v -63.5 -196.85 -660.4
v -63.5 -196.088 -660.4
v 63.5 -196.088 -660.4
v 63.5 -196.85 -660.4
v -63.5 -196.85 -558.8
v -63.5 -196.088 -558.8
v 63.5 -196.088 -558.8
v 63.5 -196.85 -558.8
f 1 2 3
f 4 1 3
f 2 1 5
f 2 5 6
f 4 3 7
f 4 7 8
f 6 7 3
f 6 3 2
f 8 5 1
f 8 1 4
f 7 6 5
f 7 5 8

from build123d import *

# Parameters (mm, degrees)
BOSS_EXTRUDE1_DEPTH             = 479.425
BOSS_EXTRUDE1_2_DEPTH           = 479.425
SKETCH2_R                       = 1.5875
SKETCH2_W                       = 5.588
SKETCH2_H                       = 25.4
BOSS_EXTRUDE2_DEPTH             = 3.175
SKETCH3_R                       = 1.5875
BOSS_EXTRUDE3_DEPTH             = 3.175
SKETCH4_R                       = 1.5875
BOSS_EXTRUDE4_DEPTH             = 3.175
BOSS_EXTRUDE5_DEPTH             = 3.175
SKETCH6_R                       = 1.5875
BOSS_EXTRUDE6_DEPTH             = 3.175
BOSS_EXTRUDE8_RIGHT_START       = -0.762
SKETCH8_W                       = 3.175
SKETCH8_H                       = 25.4
BOSS_EXTRUDE8_RIGHT_DEPTH       = 5.588
BOSS_EXTRUDE8_LEFT_START        = -189.738
BOSS_EXTRUDE8_LEFT_OUTLINE_W    = 3.175
BOSS_EXTRUDE8_LEFT_OUTLINE_H    = 25.4
BOSS_EXTRUDE8_LEFT_DEPTH        = 5.588
BASE_FLANGE1_DEPTH              = 482.6
BASE_FLANGE2_DEPTH              = 482.6
SKETCH13_W                      = 0.762
SKETCH13_H                      = 63.5
BASE_FLANGE3_DEPTH              = 482.6
HOLE1_START                     = 93
HOLE1_OUTLINE_R                 = 1.7526
HOLE1_DEPTH                     = 3
HOLE1_START_2                   = 88
HOLE1_2_OUTLINE_R               = 1.7526
HOLE1_2_DEPTH                   = 7
SKETCH24_W                      = 1.35255
SKETCH24_H                      = 184.15
F_6_32_TAPPED_HOLE1_AT_2_COUNT  = 2
F_6_32_TAPPED_HOLE1_AT_2_PITCH  = 152.4
F_6_32_TAPPED_HOLE1_AT_3_COUNT  = 2
F_6_32_TAPPED_HOLE1_AT_3_PITCH  = 304.8
F_6_32_TAPPED_HOLE1_AT_4_COUNT  = 2
F_6_32_TAPPED_HOLE1_AT_4_PITCH  = 457.2
HOLE2_START                     = -96
HOLE2_OUTLINE_R                 = 1.7526
HOLE2_DEPTH                     = 192
HOLE2_START_2                   = -95
HOLE2_2_OUTLINE_R               = 1.7526
HOLE2_2_DEPTH                   = 7
HOLE2_START_3                   = 88
HOLE2_3_OUTLINE_R               = 1.7526
HOLE2_3_DEPTH                   = 7
SKETCH26_W                      = 1.35255
SKETCH26_H                      = 184.15
F_6_32_TAPPED_HOLE2_AT_2_COUNT  = 2
F_6_32_TAPPED_HOLE2_AT_2_PITCH  = 50.8
F_6_32_TAPPED_HOLE2_AT_3_COUNT  = 2
F_6_32_TAPPED_HOLE2_AT_3_PITCH  = 101.6
F_6_32_TAPPED_HOLE2_AT_4_COUNT  = 2
F_6_32_TAPPED_HOLE2_AT_4_PITCH  = 152.4
F_6_32_TAPPED_HOLE2_AT_5_COUNT  = 2
F_6_32_TAPPED_HOLE2_AT_5_PITCH  = 203.2
F_6_32_TAPPED_HOLE2_AT_6_COUNT  = 2
F_6_32_TAPPED_HOLE2_AT_6_PITCH  = 254
F_6_32_TAPPED_HOLE2_AT_7_COUNT  = 2
F_6_32_TAPPED_HOLE2_AT_7_PITCH  = 304.8
F_6_32_TAPPED_HOLE2_AT_8_COUNT  = 2
F_6_32_TAPPED_HOLE2_AT_8_PITCH  = 355.6
F_6_32_TAPPED_HOLE2_AT_9_COUNT  = 2
F_6_32_TAPPED_HOLE2_AT_9_PITCH  = 406.4
F_6_32_TAPPED_HOLE2_AT_10_COUNT = 2
F_6_32_TAPPED_HOLE2_AT_10_PITCH = 457.2
SKETCH21_W                      = 1.35255
SKETCH21_H                      = 3.176
F_6_32_TAPPED_HOLE3_AT_2_COUNT  = 2
F_6_32_TAPPED_HOLE3_AT_2_PITCH  = 25.4
F_6_32_TAPPED_HOLE3_AT_3_COUNT  = 2
F_6_32_TAPPED_HOLE3_AT_3_PITCH  = 50.8
F_6_32_TAPPED_HOLE3_AT_4_COUNT  = 2
F_6_32_TAPPED_HOLE3_AT_4_PITCH  = 76.2
F_6_32_TAPPED_HOLE3_AT_5_COUNT  = 2
F_6_32_TAPPED_HOLE3_AT_5_PITCH  = 101.6
F_6_32_TAPPED_HOLE3_AT_6_COUNT  = 2
F_6_32_TAPPED_HOLE3_AT_6_PITCH  = 127
F_6_32_TAPPED_HOLE3_AT_7_COUNT  = 2
F_6_32_TAPPED_HOLE3_AT_7_PITCH  = 203.2
F_6_32_TAPPED_HOLE3_AT_8_COUNT  = 2
F_6_32_TAPPED_HOLE3_AT_8_PITCH  = 152.4
F_6_32_TAPPED_HOLE3_AT_9_COUNT  = 2
F_6_32_TAPPED_HOLE3_AT_9_PITCH  = 177.8
F_6_32_TAPPED_HOLE3_AT_10_COUNT = 2
F_6_32_TAPPED_HOLE3_AT_10_PITCH = 254
F_6_32_TAPPED_HOLE3_AT_11_COUNT = 2
F_6_32_TAPPED_HOLE3_AT_11_PITCH = 279.4
F_6_32_TAPPED_HOLE3_AT_12_COUNT = 2
F_6_32_TAPPED_HOLE3_AT_12_PITCH = 304.8
F_6_32_TAPPED_HOLE3_AT_13_COUNT = 2
F_6_32_TAPPED_HOLE3_AT_13_PITCH = 330.2
F_6_32_TAPPED_HOLE3_AT_14_COUNT = 2
F_6_32_TAPPED_HOLE3_AT_14_PITCH = 355.6
F_6_32_TAPPED_HOLE3_AT_15_COUNT = 2
F_6_32_TAPPED_HOLE3_AT_15_PITCH = 381
F_6_32_TAPPED_HOLE3_AT_16_COUNT = 2
F_6_32_TAPPED_HOLE3_AT_16_PITCH = 406.4
F_6_32_TAPPED_HOLE3_AT_17_COUNT = 2
F_6_32_TAPPED_HOLE3_AT_17_PITCH = 431.8
MIRROR1_COPY_1_SKETCH_W         = 1.35255
MIRROR1_COPY_1_SKETCH_H         = 3.176
MIRROR1_COPY_2_SKETCH_W         = 1.35255
MIRROR1_COPY_2_SKETCH_H         = 3.176
MIRROR1_COPY_3_SKETCH_W         = 1.35255
MIRROR1_COPY_3_SKETCH_H         = 3.176
MIRROR1_COPY_4_SKETCH_W         = 1.35255
MIRROR1_COPY_4_SKETCH_H         = 3.176
MIRROR1_COPY_5_SKETCH_W         = 1.35255
MIRROR1_COPY_5_SKETCH_H         = 3.176
MIRROR1_COPY_6_SKETCH_W         = 1.35255
MIRROR1_COPY_6_SKETCH_H         = 3.176
MIRROR1_COPY_7_SKETCH_W         = 1.35255
MIRROR1_COPY_7_SKETCH_H         = 3.176
MIRROR1_COPY_8_SKETCH_W         = 1.35255
MIRROR1_COPY_8_SKETCH_H         = 3.176
MIRROR1_COPY_9_SKETCH_W         = 1.35255
MIRROR1_COPY_9_SKETCH_H         = 3.176
MIRROR1_COPY_10_SKETCH_W        = 1.35255
MIRROR1_COPY_10_SKETCH_H        = 3.176
MIRROR1_COPY_11_SKETCH_W        = 1.35255
MIRROR1_COPY_11_SKETCH_H        = 3.176
MIRROR1_COPY_12_SKETCH_W        = 1.35255
MIRROR1_COPY_12_SKETCH_H        = 3.176
MIRROR1_COPY_13_SKETCH_W        = 1.35255
MIRROR1_COPY_13_SKETCH_H        = 3.176
MIRROR1_COPY_14_SKETCH_W        = 1.35255
MIRROR1_COPY_14_SKETCH_H        = 3.176
MIRROR1_COPY_15_SKETCH_W        = 1.35255
MIRROR1_COPY_15_SKETCH_H        = 3.176
MIRROR1_COPY_16_SKETCH_W        = 1.35255
MIRROR1_COPY_16_SKETCH_H        = 3.176
SKETCH9_R                       = 1.5875
NOSECONE_BASE_DEPTH             = 3.175
NOSECONE_BASE_DRAFT             = 20
SPLIT1_START                    = -558.8
SPLIT1_DEPTH                    = 361.95
SPLIT1_START_2                  = -679.45
SPLIT1_2_DEPTH                  = 120.65
SPLIT1_3_OUTLINE_W              = 127
SPLIT1_3_OUTLINE_H              = 0.762
SPLIT1_3_DEPTH                  = 19.05


with BuildPart() as part:
    # Sketch1 → Boss-Extrude1 (new body)
    with BuildSketch(Plane.XY.offset(-196.85)):
        Polygon((88.9, -136.525), (85.725, -136.525), (85.725, -114.3), (63.5, -114.3), (63.5, -111.125), (88.9, -111.125), align=None)
    extrude(amount=-BOSS_EXTRUDE1_DEPTH)

    # Sketch24 → #6-32 Tapped Hole1 (revolve, cut)
    with BuildSketch(Plane(origin=(88.9, -117.475, -209.55), x_dir=(0, 0, -1), z_dir=(0, 1, 0))):
        with Locations((0.676275, 92.075)):
            Rectangle(SKETCH24_W, SKETCH24_H)
    f_6_32_tapped_hole1 = revolve(axis=Axis((95.25, -117.475, -209.55), (-1, 0, 0)), mode=Mode.SUBTRACT)

    # #6-32 Tapped Hole1 at 2: #6-32 Tapped Hole1 ×2
    with Locations(*[(0, 0, -i * F_6_32_TAPPED_HOLE1_AT_2_PITCH) for i in range(1, F_6_32_TAPPED_HOLE1_AT_2_COUNT)]):
        add(f_6_32_tapped_hole1, mode=Mode.SUBTRACT)

    # #6-32 Tapped Hole1 at 3: #6-32 Tapped Hole1 ×2
    with Locations(*[(0, 0, -i * F_6_32_TAPPED_HOLE1_AT_3_PITCH) for i in range(1, F_6_32_TAPPED_HOLE1_AT_3_COUNT)]):
        add(f_6_32_tapped_hole1, mode=Mode.SUBTRACT)

    # #6-32 Tapped Hole1 at 4: #6-32 Tapped Hole1 ×2
    with Locations(*[(0, 0, -i * F_6_32_TAPPED_HOLE1_AT_4_PITCH) for i in range(1, F_6_32_TAPPED_HOLE1_AT_4_COUNT)]):
        add(f_6_32_tapped_hole1, mode=Mode.SUBTRACT)


with BuildPart() as body_2:
    # Sketch1 → Boss-Extrude1 2 (new body)
    with BuildSketch(Plane.XY.offset(-196.85)):
        Polygon((-63.5, -114.3), (-63.5, -111.125), (-88.9, -111.125), (-88.9, -136.525), (-85.725, -136.525), (-85.725, -114.3), align=None)
    extrude(amount=-BOSS_EXTRUDE1_2_DEPTH)


with BuildPart() as body_3:
    # Sketch2 → Boss-Extrude2 (new body)
    # profile 1 of 3: a face of its own
    with BuildSketch(Plane.XY.offset(-196.85)):
        with BuildLine():
            Line((94.488, -171.45), (94.488, -136.525))
            Line((94.488, -136.525), (88.9, -136.525))
            Line((88.9, -136.525), (85.725, -136.525))
            Line((85.725, -136.525), (85.725, -114.3))
            Line((85.725, -114.3), (63.5, -114.3))
            Line((63.5, -114.3), (63.5, -111.125))
            Line((63.5, -111.125), (88.9, -111.125))
            Line((88.9, -111.125), (88.9, -85.725))
            Line((88.9, -85.725), (88.9, -60.325))
            Line((88.9, -60.325), (94.488, -60.325))
            Line((94.488, -60.325), (94.488, -25.4))
            ThreePointArc((94.488, -25.4), (87.271696875, -7.978303125), (69.85, -0.762))
            Line((69.85, -0.762), (-69.85, -0.762))
            ThreePointArc((-69.85, -0.762), (-87.271696875, -7.978303125), (-94.488, -25.4))
            Line((-94.488, -25.4), (-94.488, -60.325))
            Line((-94.488, -60.325), (-88.9, -60.325))
            Line((-88.9, -60.325), (-88.9, -85.725))
            Line((-88.9, -85.725), (-94.488, -85.725))
            Line((-94.488, -85.725), (-94.488, -111.125))
            Line((-94.488, -111.125), (-88.9, -111.125))
            Line((-88.9, -111.125), (-63.5, -111.125))
            Line((-63.5, -111.125), (-63.5, -114.3))
            Line((-63.5, -114.3), (-85.725, -114.3))
            Line((-85.725, -114.3), (-85.725, -136.525))
            Line((-85.725, -136.525), (-88.9, -136.525))
            Line((-88.9, -136.525), (-94.488, -136.525))
            Line((-94.488, -136.525), (-94.488, -171.45))
            ThreePointArc((-94.488, -171.45), (-87.271696875, -188.871696875), (-69.85, -196.088))
            Line((-69.85, -196.088), (69.85, -196.088))
            ThreePointArc((69.85, -196.088), (87.271696875, -188.871696875), (94.488, -171.45))
        make_face()
        with Locations((-19.05, -155.575)):
            Circle(SKETCH2_R, mode=Mode.SUBTRACT)
        with Locations((-19.05, -127)):
            Circle(SKETCH2_R, mode=Mode.SUBTRACT)
        with Locations((19.05, -155.575)):
            Circle(SKETCH2_R, mode=Mode.SUBTRACT)
        with Locations((19.05, -127)):
            Circle(SKETCH2_R, mode=Mode.SUBTRACT)
        with Locations((-83.82, -84.836714101)):
            Circle(SKETCH2_R, mode=Mode.SUBTRACT)
        with BuildLine():
            ThreePointArc((-64.77, -88.9), (-68.362102448, -87.412102448), (-69.85, -83.82))
            Line((-69.85, -83.82), (-69.85, -54.309589078))
            ThreePointArc((-69.85, -54.309589078), (-66.714031836, -49.616281053), (-61.177897552, -50.71748663))
            Line((-61.177897552, -50.71748663), (-31.66748663, -80.227897552))
            ThreePointArc((-31.66748663, -80.227897552), (-30.566281053, -85.764031836), (-35.259589078, -88.9))
            Line((-35.259589078, -88.9), (-64.77, -88.9))
        make_face(mode=Mode.SUBTRACT)
        with BuildLine():
            ThreePointArc((-50.88251337, -34.072102448), (-51.983718947, -28.535968164), (-47.290410922, -25.4))
            Line((-47.290410922, -25.4), (47.290410922, -25.4))
            ThreePointArc((47.290410922, -25.4), (51.983718947, -28.535968164), (50.88251337, -34.072102448))
            Line((50.88251337, -34.072102448), (3.592102448, -81.36251337))
            ThreePointArc((3.592102448, -81.36251337), (0, -82.850410922), (-3.592102448, -81.36251337))
            Line((-3.592102448, -81.36251337), (-50.88251337, -34.072102448))
        make_face(mode=Mode.SUBTRACT)
        with Locations((-19.05, -12.7)):
            Circle(SKETCH2_R, mode=Mode.SUBTRACT)
        with BuildLine():
            Line((64.77, -88.9), (35.259589078, -88.9))
            ThreePointArc((35.259589078, -88.9), (30.566281053, -85.764031836), (31.66748663, -80.227897552))
            Line((31.66748663, -80.227897552), (61.177897552, -50.71748663))
            ThreePointArc((61.177897552, -50.71748663), (66.714031836, -49.616281053), (69.85, -54.309589078))
            Line((69.85, -54.309589078), (69.85, -83.82))
            ThreePointArc((69.85, -83.82), (68.362102448, -87.412102448), (64.77, -88.9))
        make_face(mode=Mode.SUBTRACT)
        with Locations((19.05, -12.7)):
            Circle(SKETCH2_R, mode=Mode.SUBTRACT)
    # profile 2 of 3: a face of its own
    with BuildSketch(Plane.XY.offset(-196.85)):
        with Locations((91.694, -98.425)):
            Rectangle(SKETCH2_W, SKETCH2_H)
    # profile 3 of 3: a face of its own
    with BuildSketch(Plane.XY.offset(-196.85)):
        with BuildLine():
            Line((94.488, -171.45), (94.488, -136.525))
            Line((94.488, -136.525), (88.9, -136.525))
            Line((88.9, -136.525), (85.725, -136.525))
            Line((85.725, -136.525), (85.725, -114.3))
            Line((85.725, -114.3), (63.5, -114.3))
            Line((63.5, -114.3), (63.5, -111.125))
            Line((63.5, -111.125), (88.9, -111.125))
            Line((88.9, -111.125), (88.9, -85.725))
            Line((88.9, -85.725), (88.9, -60.325))
            Line((88.9, -60.325), (94.488, -60.325))
            Line((94.488, -60.325), (94.488, -25.4))
            ThreePointArc((94.488, -25.4), (87.271696875, -7.978303125), (69.85, -0.762))
            Line((69.85, -0.762), (-69.85, -0.762))
            ThreePointArc((-69.85, -0.762), (-87.271696875, -7.978303125), (-94.488, -25.4))
            Line((-94.488, -25.4), (-94.488, -60.325))
            Line((-94.488, -60.325), (-88.9, -60.325))
            Line((-88.9, -60.325), (-88.9, -85.725))
            Line((-88.9, -85.725), (-94.488, -85.725))
            Line((-94.488, -85.725), (-94.488, -111.125))
            Line((-94.488, -111.125), (-88.9, -111.125))
            Line((-88.9, -111.125), (-63.5, -111.125))
            Line((-63.5, -111.125), (-63.5, -114.3))
            Line((-63.5, -114.3), (-85.725, -114.3))
            Line((-85.725, -114.3), (-85.725, -136.525))
            Line((-85.725, -136.525), (-88.9, -136.525))
            Line((-88.9, -136.525), (-94.488, -136.525))
            Line((-94.488, -136.525), (-94.488, -171.45))
            ThreePointArc((-94.488, -171.45), (-87.271696875, -188.871696875), (-69.85, -196.088))
            Line((-69.85, -196.088), (69.85, -196.088))
            ThreePointArc((69.85, -196.088), (87.271696875, -188.871696875), (94.488, -171.45))
        make_face()
        with Locations((-19.05, -155.575)):
            Circle(SKETCH2_R, mode=Mode.SUBTRACT)
        with Locations((-19.05, -127)):
            Circle(SKETCH2_R, mode=Mode.SUBTRACT)
        with Locations((19.05, -155.575)):
            Circle(SKETCH2_R, mode=Mode.SUBTRACT)
        with Locations((19.05, -127)):
            Circle(SKETCH2_R, mode=Mode.SUBTRACT)
        with Locations((-83.82, -84.836714101)):
            Circle(SKETCH2_R, mode=Mode.SUBTRACT)
        with BuildLine():
            ThreePointArc((-64.77, -88.9), (-68.362102448, -87.412102448), (-69.85, -83.82))
            Line((-69.85, -83.82), (-69.85, -54.309589078))
            ThreePointArc((-69.85, -54.309589078), (-66.714031836, -49.616281053), (-61.177897552, -50.71748663))
            Line((-61.177897552, -50.71748663), (-31.66748663, -80.227897552))
            ThreePointArc((-31.66748663, -80.227897552), (-30.566281053, -85.764031836), (-35.259589078, -88.9))
            Line((-35.259589078, -88.9), (-64.77, -88.9))
        make_face(mode=Mode.SUBTRACT)
        with BuildLine():
            ThreePointArc((-50.88251337, -34.072102448), (-51.983718947, -28.535968164), (-47.290410922, -25.4))
            Line((-47.290410922, -25.4), (47.290410922, -25.4))
            ThreePointArc((47.290410922, -25.4), (51.983718947, -28.535968164), (50.88251337, -34.072102448))
            Line((50.88251337, -34.072102448), (3.592102448, -81.36251337))
            ThreePointArc((3.592102448, -81.36251337), (0, -82.850410922), (-3.592102448, -81.36251337))
            Line((-3.592102448, -81.36251337), (-50.88251337, -34.072102448))
        make_face(mode=Mode.SUBTRACT)
        with Locations((-19.05, -12.7)):
            Circle(SKETCH2_R, mode=Mode.SUBTRACT)
        with BuildLine():
            Line((64.77, -88.9), (35.259589078, -88.9))
            ThreePointArc((35.259589078, -88.9), (30.566281053, -85.764031836), (31.66748663, -80.227897552))
            Line((31.66748663, -80.227897552), (61.177897552, -50.71748663))
            ThreePointArc((61.177897552, -50.71748663), (66.714031836, -49.616281053), (69.85, -54.309589078))
            Line((69.85, -54.309589078), (69.85, -83.82))
            ThreePointArc((69.85, -83.82), (68.362102448, -87.412102448), (64.77, -88.9))
        make_face(mode=Mode.SUBTRACT)
        with Locations((19.05, -12.7)):
            Circle(SKETCH2_R, mode=Mode.SUBTRACT)
    extrude(amount=-BOSS_EXTRUDE2_DEPTH)


with BuildPart() as body_4:
    # Sketch3 → Boss-Extrude3 (new body)
    with BuildSketch(Plane.XY.offset(-450.85)):
        Polygon((88.9, -111.125), (63.5, -111.125), (63.5, -114.3), (85.725, -114.3), (85.725, -136.525), (-85.725, -136.525), (-85.725, -114.3), (-63.5, -114.3), (-63.5, -111.125), (-88.9, -111.125), (-94.488, -111.125), (-94.488, -85.725), (-88.9, -85.725), (-88.9, -60.325), (88.9, -60.325), (88.9, -85.725), (94.488, -85.725), (94.488, -111.125), align=None)
        with Locations((-83.82, -84.836714101)):
            Circle(SKETCH3_R, mode=Mode.SUBTRACT)
        with BuildLine():
            Line((-25.4, -85.725), (25.4, -85.725))
            ThreePointArc((25.4, -85.725), (38.1, -98.425), (25.4, -111.125))
            Line((25.4, -111.125), (-25.4, -111.125))
            ThreePointArc((-25.4, -111.125), (-38.1, -98.425), (-25.4, -85.725))
        make_face(mode=Mode.SUBTRACT)
    extrude(amount=BOSS_EXTRUDE3_DEPTH)


with BuildPart() as body_5:
    # Sketch4 → Boss-Extrude4 (new body)
    with BuildSketch(Plane.XY.offset(-679.45)):
        with BuildLine():
            Line((88.9, -136.525), (88.9, -111.125))
            Line((88.9, -111.125), (94.488, -111.125))
            Line((94.488, -111.125), (94.488, -85.725))
            Line((94.488, -85.725), (88.9, -85.725))
            Line((88.9, -85.725), (88.9, -60.325))
            Line((88.9, -60.325), (94.488, -60.325))
            Line((94.488, -60.325), (94.488, -25.4))
            ThreePointArc((94.488, -25.4), (87.271696875, -7.978303125), (69.85, -0.762))
            Line((69.85, -0.762), (-69.85, -0.762))
            ThreePointArc((-69.85, -0.762), (-87.271696875, -7.978303125), (-94.488, -25.4))
            Line((-94.488, -25.4), (-94.488, -60.325))
            Line((-94.488, -60.325), (-88.9, -60.325))
            Line((-88.9, -60.325), (-88.9, -85.725))
            Line((-88.9, -85.725), (-94.488, -85.725))
            Line((-94.488, -85.725), (-94.488, -111.125))
            Line((-94.488, -111.125), (-88.9, -111.125))
            Line((-88.9, -111.125), (-88.9, -136.525))
            Line((-88.9, -136.525), (-94.488, -136.525))
            Line((-94.488, -136.525), (-94.488, -171.45))
            ThreePointArc((-94.488, -171.45), (-87.271696875, -188.871696875), (-69.85, -196.088))
            Line((-69.85, -196.088), (69.85, -196.088))
            ThreePointArc((69.85, -196.088), (87.271696875, -188.871696875), (94.488, -171.45))
            Line((94.488, -171.45), (94.488, -136.525))
            Line((94.488, -136.525), (88.9, -136.525))
        make_face()
        with Locations((25.4, -184.15)):
            Circle(SKETCH4_R, mode=Mode.SUBTRACT)
        with Locations(Location((-25.4, -184.15, 0), (0, 0, 180))):
            Circle(SKETCH4_R, mode=Mode.SUBTRACT)
        with Locations(Location((-63.1655201, -45.2492872, 0), (0, 0, 180))):
            Circle(SKETCH4_R, mode=Mode.SUBTRACT)
        with Locations(Location((-63.1655201, -133.35, 0), (0, 0, 180))):
            Circle(SKETCH4_R, mode=Mode.SUBTRACT)
        with Locations((63.1655201, -45.2492872)):
            Circle(SKETCH4_R, mode=Mode.SUBTRACT)
        with Locations((63.1655201, -133.35)):
            Circle(SKETCH4_R, mode=Mode.SUBTRACT)
        with Locations((-83.82, -84.836714101)):
            Circle(SKETCH4_R, mode=Mode.SUBTRACT)
        with BuildLine():
            Line((-3.271622644, -113.630048555), (-49.273936974, -152.356965567))
            ThreePointArc((-49.273936974, -152.356965567), (-50.774552528, -157.984513496), (-46.00231433, -161.323208647))
            Line((-46.00231433, -161.323208647), (46.00231433, -161.323208647))
            ThreePointArc((46.00231433, -161.323208647), (50.774552528, -157.984513496), (49.273936974, -152.356965567))
            Line((49.273936974, -152.356965567), (3.271622644, -113.630048555))
            ThreePointArc((3.271622644, -113.630048555), (0, -112.436291635), (-3.271622644, -113.630048555))
        make_face(mode=Mode.SUBTRACT)
        with BuildLine():
            Line((-46.00231433, -35.526791353), (46.00231433, -35.526791353))
            ThreePointArc((46.00231433, -35.526791353), (50.774552528, -38.865486504), (49.273936974, -44.493034433))
            Line((49.273936974, -44.493034433), (3.271622644, -83.219951445))
            ThreePointArc((3.271622644, -83.219951445), (0, -84.413708365), (-3.271622644, -83.219951445))
            Line((-3.271622644, -83.219951445), (-49.273936974, -44.493034433))
            ThreePointArc((-49.273936974, -44.493034433), (-50.774552528, -38.865486504), (-46.00231433, -35.526791353))
        make_face(mode=Mode.SUBTRACT)
        with BuildLine():
            Line((25.440586882, -89.45875692), (54.813897456, -64.730919255))
            ThreePointArc((54.813897456, -64.730919255), (60.228713625, -64.011391876), (63.1655201, -68.617162335))
            Line((63.1655201, -68.617162335), (63.1655201, -93.345))
            ThreePointArc((63.1655201, -93.345), (61.677622548, -96.937102448), (58.0855201, -98.425))
            Line((58.0855201, -98.425), (28.712209526, -98.425))
            ThreePointArc((28.712209526, -98.425), (23.939971328, -95.086304849), (25.440586882, -89.45875692))
        make_face(mode=Mode.SUBTRACT)
        with BuildLine():
            Line((-63.1655201, -68.617162335), (-63.1655201, -93.345))
            ThreePointArc((-63.1655201, -93.345), (-61.677622548, -96.937102448), (-58.0855201, -98.425))
            Line((-58.0855201, -98.425), (-28.712209526, -98.425))
            ThreePointArc((-28.712209526, -98.425), (-23.939971328, -95.086304849), (-25.440586882, -89.45875692))
            Line((-25.440586882, -89.45875692), (-54.813897456, -64.730919255))
            ThreePointArc((-54.813897456, -64.730919255), (-60.228713625, -64.011391876), (-63.1655201, -68.617162335))
        make_face(mode=Mode.SUBTRACT)
    extrude(amount=BOSS_EXTRUDE4_DEPTH)


with BuildPart() as body_6:
    # Sketch5 → Boss-Extrude5 (new body)
    with BuildSketch(Plane.XY.offset(-450.85)):
        with BuildLine():
            Line((69.85, -0.762), (69.85, -1.203250218))
            ThreePointArc((69.85, -1.203250218), (83.566, -10.002068321), (88.9, -25.4))
            Line((88.9, -25.4), (88.9, -60.325))
            Line((88.9, -60.325), (94.488, -60.325))
            Line((94.488, -60.325), (94.488, -25.4))
            ThreePointArc((94.488, -25.4), (87.271696875, -7.978303125), (69.85, -0.762))
        make_face()
    extrude(amount=-BOSS_EXTRUDE5_DEPTH)


with BuildPart() as body_7:
    # Sketch6 → Boss-Extrude6 (new body)
    with BuildSketch(Plane.XY.offset(-450.85)):
        with BuildLine():
            Line((-94.488, -25.4), (-94.488, -59.98389124))
            ThreePointArc((-94.488, -59.98389124), (-66.117668406, -64.389306336), (-57.695875243, -91.836652233))
            Line((-57.695875243, -91.836652233), (-61.777576564, -96.701034447))
            Line((-61.777576564, -96.701034447), (-80.554638943, -80.94520833))
            ThreePointArc((-80.554638943, -80.94520833), (-87.711505771, -81.571353044), (-87.085361057, -88.728219872))
            Line((-87.085361057, -88.728219872), (-68.308298678, -104.484045989))
            Line((-68.308298678, -104.484045989), (-58.302651908, -106.248311474))
            Line((-58.302651908, -106.248311474), (-50.955589529, -97.492423489))
            ThreePointArc((-50.955589529, -97.492423489), (-45.450014055, -78.708264177), (-55.529491864, -61.928510619))
            Line((-55.529491864, -61.928510619), (-78.407186312, -45.704558542))
            ThreePointArc((-78.407186312, -45.704558542), (-88.452181648, -20.699611978), (-69.85, -1.203250218))
            Line((-69.85, -1.203250218), (-69.85, -0.762))
            ThreePointArc((-69.85, -0.762), (-87.271696875, -7.978303125), (-94.488, -25.4))
        make_face()
        with Locations((-83.82, -84.836714101)):
            Circle(SKETCH6_R, mode=Mode.SUBTRACT)
    extrude(amount=-BOSS_EXTRUDE6_DEPTH)


with BuildPart() as body_8:
    # Sketch8 → Boss-Extrude8-Right (new body)
    with BuildSketch(Plane(origin=(95.25, 0, 0), x_dir=(0, 0, -1), z_dir=(1, 0, 0)).offset(BOSS_EXTRUDE8_RIGHT_START)):
        Polygon((196.85, -60.325), (679.45, -60.325), (679.45, -85.725), (676.275, -85.725), (676.275, -111.125), (679.45, -111.125), (679.45, -136.525), (196.85, -136.525), (196.85, -111.125), (200.025, -111.125), (200.025, -85.725), (196.85, -85.725), align=None)
        with Locations((449.2625, -98.425)):
            Rectangle(SKETCH8_W, SKETCH8_H, mode=Mode.SUBTRACT)
    extrude(amount=-BOSS_EXTRUDE8_RIGHT_DEPTH)

    # Hole1 2 outline → Hole1 2 (cut)
    with BuildSketch(Plane.YZ.offset(HOLE1_START_2)):
        with Locations((-117.475, -666.75)):
            Circle(HOLE1_2_OUTLINE_R)
        with Locations((-117.475, -514.35)):
            Circle(HOLE1_2_OUTLINE_R)
        with Locations((-117.475, -361.95)):
            Circle(HOLE1_2_OUTLINE_R)
        with Locations((-117.475, -209.55)):
            Circle(HOLE1_2_OUTLINE_R)
    extrude(amount=HOLE1_2_DEPTH, mode=Mode.SUBTRACT)

    # Hole2 3 outline → Hole2 3 (cut)
    with BuildSketch(Plane.YZ.offset(HOLE2_START_3)):
        with Locations((-130.175, -666.75)):
            Circle(HOLE2_3_OUTLINE_R)
        with Locations((-130.175, -615.95)):
            Circle(HOLE2_3_OUTLINE_R)
        with Locations((-130.175, -565.15)):
            Circle(HOLE2_3_OUTLINE_R)
        with Locations((-130.175, -514.35)):
            Circle(HOLE2_3_OUTLINE_R)
        with Locations((-130.175, -463.55)):
            Circle(HOLE2_3_OUTLINE_R)
        with Locations((-130.175, -412.75)):
            Circle(HOLE2_3_OUTLINE_R)
        with Locations((-130.175, -361.95)):
            Circle(HOLE2_3_OUTLINE_R)
        with Locations((-130.175, -311.15)):
            Circle(HOLE2_3_OUTLINE_R)
        with Locations((-130.175, -260.35)):
            Circle(HOLE2_3_OUTLINE_R)
        with Locations((-130.175, -209.55)):
            Circle(HOLE2_3_OUTLINE_R)
    extrude(amount=HOLE2_3_DEPTH, mode=Mode.SUBTRACT)


with BuildPart() as body_9:
    # Boss-Extrude8-Left: read off the stored shape, not the designer's step
    # Boss-Extrude8-Left outline → Boss-Extrude8-Left (new body)
    with BuildSketch(Plane(origin=(95.25, 0, 0), x_dir=(0, 0, -1), z_dir=(1, 0, 0)).offset(BOSS_EXTRUDE8_LEFT_START)):
        Polygon((196.85, -60.325), (196.85, -85.725), (200.025, -85.725), (200.025, -111.125), (196.85, -111.125), (196.85, -136.525), (679.45, -136.525), (679.45, -111.125), (676.275, -111.125), (676.275, -85.725), (679.45, -85.725), (679.45, -60.325), align=None)
        with Locations((449.2625, -98.425)):
            Rectangle(BOSS_EXTRUDE8_LEFT_OUTLINE_W, BOSS_EXTRUDE8_LEFT_OUTLINE_H, mode=Mode.SUBTRACT)
    extrude(amount=BOSS_EXTRUDE8_LEFT_DEPTH)

    # Hole2 2 outline → Hole2 2 (cut)
    with BuildSketch(Plane.YZ.offset(HOLE2_START_2)):
        with Locations((-130.175, -666.75)):
            Circle(HOLE2_2_OUTLINE_R)
        with Locations((-130.175, -615.95)):
            Circle(HOLE2_2_OUTLINE_R)
        with Locations((-130.175, -565.15)):
            Circle(HOLE2_2_OUTLINE_R)
        with Locations((-130.175, -514.35)):
            Circle(HOLE2_2_OUTLINE_R)
        with Locations((-130.175, -463.55)):
            Circle(HOLE2_2_OUTLINE_R)
        with Locations((-130.175, -412.75)):
            Circle(HOLE2_2_OUTLINE_R)
        with Locations((-130.175, -361.95)):
            Circle(HOLE2_2_OUTLINE_R)
        with Locations((-130.175, -311.15)):
            Circle(HOLE2_2_OUTLINE_R)
        with Locations((-130.175, -260.35)):
            Circle(HOLE2_2_OUTLINE_R)
        with Locations((-130.175, -209.55)):
            Circle(HOLE2_2_OUTLINE_R)
    extrude(amount=HOLE2_2_DEPTH, mode=Mode.SUBTRACT)


with BuildPart() as body_10:
    # Base-Flange1: sheet metal written as solids
    # Sketch11 → Base-Flange1 (new body)
    with BuildSketch(Plane.XY.offset(-196.85)):
        with BuildLine():
            Line((95.25, -123.825), (95.25, -25.4))
            ThreePointArc((95.25, -25.4), (87.810512242, -7.439487758), (69.85, 0))
            Line((69.85, 0), (-69.85, 0))
            ThreePointArc((-69.85, 0), (-87.810512242, -7.439487758), (-95.25, -25.4))
            Line((-95.25, -25.4), (-95.25, -60.325))
            Line((-95.25, -60.325), (-94.488, -60.325))
            Line((-94.488, -60.325), (-94.488, -25.4))
            ThreePointArc((-94.488, -25.4), (-87.271696875, -7.978303125), (-69.85, -0.762))
            Line((-69.85, -0.762), (69.85, -0.762))
            ThreePointArc((69.85, -0.762), (87.271696875, -7.978303125), (94.488, -25.4))
            Line((94.488, -25.4), (94.488, -123.825))
            Line((94.488, -123.825), (95.25, -123.825))
        make_face()
    extrude(amount=-BASE_FLANGE1_DEPTH)

    # Hole1: read off the stored shape, not the designer's step
    # Hole1 outline → Hole1 (cut)
    with BuildSketch(Plane.YZ.offset(HOLE1_START)):
        with Locations((-117.475, -666.75)):
            Circle(HOLE1_OUTLINE_R)
        with Locations((-117.475, -514.35)):
            Circle(HOLE1_OUTLINE_R)
        with Locations((-117.475, -361.95)):
            Circle(HOLE1_OUTLINE_R)
        with Locations((-117.475, -209.55)):
            Circle(HOLE1_OUTLINE_R)
    extrude(amount=HOLE1_DEPTH, mode=Mode.SUBTRACT)


with BuildPart() as body_11:
    # Base-Flange2: sheet metal written as solids
    # Sketch12 → Base-Flange2 (new body)
    with BuildSketch(Plane.XY.offset(-196.85)):
        with BuildLine():
            Line((-95.25, -123.825), (-95.25, -171.45))
            ThreePointArc((-95.25, -171.45), (-87.810512242, -189.410512242), (-69.85, -196.85))
            Line((-69.85, -196.85), (69.85, -196.85))
            ThreePointArc((69.85, -196.85), (87.810512242, -189.410512242), (95.25, -171.45))
            Line((95.25, -171.45), (95.25, -123.825))
            Line((95.25, -123.825), (94.488, -123.825))
            Line((94.488, -123.825), (94.488, -171.45))
            ThreePointArc((94.488, -171.45), (87.271696875, -188.871696875), (69.85, -196.088))
            Line((69.85, -196.088), (-69.85, -196.088))
            ThreePointArc((-69.85, -196.088), (-87.271696875, -188.871696875), (-94.488, -171.45))
            Line((-94.488, -171.45), (-94.488, -123.825))
            Line((-94.488, -123.825), (-95.25, -123.825))
        make_face()
    extrude(amount=-BASE_FLANGE2_DEPTH)

    # Hole2: read off the stored shape, not the designer's step
    # Hole2 outline → Hole2 (cut)
    with BuildSketch(Plane.YZ.offset(HOLE2_START)):
        with Locations((-130.175, -666.75)):
            Circle(HOLE2_OUTLINE_R)
        with Locations((-130.175, -615.95)):
            Circle(HOLE2_OUTLINE_R)
        with Locations((-130.175, -565.15)):
            Circle(HOLE2_OUTLINE_R)
        with Locations((-130.175, -514.35)):
            Circle(HOLE2_OUTLINE_R)
        with Locations((-130.175, -463.55)):
            Circle(HOLE2_OUTLINE_R)
        with Locations((-130.175, -412.75)):
            Circle(HOLE2_OUTLINE_R)
        with Locations((-130.175, -361.95)):
            Circle(HOLE2_OUTLINE_R)
        with Locations((-130.175, -311.15)):
            Circle(HOLE2_OUTLINE_R)
        with Locations((-130.175, -260.35)):
            Circle(HOLE2_OUTLINE_R)
        with Locations((-130.175, -209.55)):
            Circle(HOLE2_OUTLINE_R)
    extrude(amount=HOLE2_DEPTH, mode=Mode.SUBTRACT)

    # Split1: read off the stored shape, not the designer's step
    # Split1 outline → Split1 (cut)
    with BuildSketch(Plane.XY.offset(SPLIT1_START)):
        with BuildLine():
            Line((69.85, -196.088), (-69.85, -196.088))
            ThreePointArc((-69.85, -196.088), (-87.271696875, -188.871696875), (-94.488, -171.45))
            Line((-94.488, -171.45), (-94.488, -123.825))
            Line((-94.488, -123.825), (-95.25, -123.825))
            Line((-95.25, -123.825), (-95.25, -171.45))
            ThreePointArc((-95.25, -171.45), (-87.810512242, -189.410512242), (-69.85, -196.85))
            Line((-69.85, -196.85), (69.85, -196.85))
            ThreePointArc((69.85, -196.85), (87.810512242, -189.410512242), (95.25, -171.45))
            Line((95.25, -171.45), (95.25, -123.825))
            Line((95.25, -123.825), (94.488, -123.825))
            Line((94.488, -123.825), (94.488, -171.45))
            ThreePointArc((94.488, -171.45), (87.271696875, -188.871696875), (69.85, -196.088))
        make_face()
    extrude(amount=SPLIT1_DEPTH, mode=Mode.SUBTRACT)

    # Split1 2 outline → Split1 2 (cut)
    with BuildSketch(Plane.XY.offset(SPLIT1_START_2)):
        with BuildLine():
            Line((69.85, -196.088), (63.5, -196.088))
            Line((63.5, -196.088), (63.5, -196.85))
            Line((63.5, -196.85), (69.85, -196.85))
            ThreePointArc((69.85, -196.85), (87.810512242, -189.410512242), (95.25, -171.45))
            Line((95.25, -171.45), (95.25, -123.825))
            Line((95.25, -123.825), (94.488, -123.825))
            Line((94.488, -123.825), (94.488, -171.45))
            ThreePointArc((94.488, -171.45), (87.271696875, -188.871696875), (69.85, -196.088))
        make_face()
        with BuildLine():
            Line((-63.5, -196.85), (-63.5, -196.088))
            Line((-63.5, -196.088), (-69.85, -196.088))
            ThreePointArc((-69.85, -196.088), (-87.271696875, -188.871696875), (-94.488, -171.45))
            Line((-94.488, -171.45), (-94.488, -123.825))
            Line((-94.488, -123.825), (-95.25, -123.825))
            Line((-95.25, -123.825), (-95.25, -171.45))
            ThreePointArc((-95.25, -171.45), (-87.810512242, -189.410512242), (-69.85, -196.85))
            Line((-69.85, -196.85), (-63.5, -196.85))
        make_face()
    extrude(amount=SPLIT1_2_DEPTH, mode=Mode.SUBTRACT)

    # Split1 3 outline → Split1 3 (cut)
    with BuildSketch(Plane.XY.offset(SPLIT1_START_2)):
        with Locations((0, -196.469)):
            Rectangle(SPLIT1_3_OUTLINE_W, SPLIT1_3_OUTLINE_H)
    extrude(amount=SPLIT1_3_DEPTH, mode=Mode.SUBTRACT)


with BuildPart() as body_12:
    # Base-Flange3: sheet metal written as solids
    # Sketch13 → Base-Flange3 (new body)
    with BuildSketch(Plane.XY.offset(-196.85)):
        with Locations((-94.869, -92.075)):
            Rectangle(SKETCH13_W, SKETCH13_H)
    extrude(amount=-BASE_FLANGE3_DEPTH)


with BuildPart() as f_6_32_tapped_hole2_tool:
    # Sketch26 → #6-32 Tapped Hole2 (revolve)
    with BuildSketch(Plane(origin=(88.9, -130.175, -209.55), x_dir=(0, 0, -1), z_dir=(0, 1, 0))):
        with Locations((0.676275, 92.075)):
            Rectangle(SKETCH26_W, SKETCH26_H)
    f_6_32_tapped_hole2 = revolve(axis=Axis((95.25, -130.175, -209.55), (-1, 0, 0)))


with BuildPart() as part_1:
    add(part.part)

    # #6-32 Tapped Hole2: cut by f_6_32_tapped_hole2_tool
    add(f_6_32_tapped_hole2_tool.part, mode=Mode.SUBTRACT)


with BuildPart() as body_2_1:
    add(body_2.part)

    # #6-32 Tapped Hole2: cut by f_6_32_tapped_hole2_tool
    add(f_6_32_tapped_hole2_tool.part, mode=Mode.SUBTRACT)


with BuildPart() as f_6_32_tapped_hole2_at_2_tool:
    # #6-32 Tapped Hole2 at 2: #6-32 Tapped Hole2 ×2
    with Locations(*[(0, 0, -i * F_6_32_TAPPED_HOLE2_AT_2_PITCH) for i in range(1, F_6_32_TAPPED_HOLE2_AT_2_COUNT)]):
        add(f_6_32_tapped_hole2)


with BuildPart() as part_2:
    add(part_1.part)

    # #6-32 Tapped Hole2 at 2: cut by f_6_32_tapped_hole2_at_2_tool
    add(f_6_32_tapped_hole2_at_2_tool.part, mode=Mode.SUBTRACT)


with BuildPart() as body_2_2:
    add(body_2_1.part)

    # #6-32 Tapped Hole2 at 2: cut by f_6_32_tapped_hole2_at_2_tool
    add(f_6_32_tapped_hole2_at_2_tool.part, mode=Mode.SUBTRACT)


with BuildPart() as f_6_32_tapped_hole2_at_3_tool:
    # #6-32 Tapped Hole2 at 3: #6-32 Tapped Hole2 ×2
    with Locations(*[(0, 0, -i * F_6_32_TAPPED_HOLE2_AT_3_PITCH) for i in range(1, F_6_32_TAPPED_HOLE2_AT_3_COUNT)]):
        add(f_6_32_tapped_hole2)


with BuildPart() as part_3:
    add(part_2.part)

    # #6-32 Tapped Hole2 at 3: cut by f_6_32_tapped_hole2_at_3_tool
    add(f_6_32_tapped_hole2_at_3_tool.part, mode=Mode.SUBTRACT)


with BuildPart() as body_2_3:
    add(body_2_2.part)

    # #6-32 Tapped Hole2 at 3: cut by f_6_32_tapped_hole2_at_3_tool
    add(f_6_32_tapped_hole2_at_3_tool.part, mode=Mode.SUBTRACT)


with BuildPart() as f_6_32_tapped_hole2_at_4_tool:
    # #6-32 Tapped Hole2 at 4: #6-32 Tapped Hole2 ×2
    with Locations(*[(0, 0, -i * F_6_32_TAPPED_HOLE2_AT_4_PITCH) for i in range(1, F_6_32_TAPPED_HOLE2_AT_4_COUNT)]):
        add(f_6_32_tapped_hole2)


with BuildPart() as part_4:
    add(part_3.part)

    # #6-32 Tapped Hole2 at 4: cut by f_6_32_tapped_hole2_at_4_tool
    add(f_6_32_tapped_hole2_at_4_tool.part, mode=Mode.SUBTRACT)


with BuildPart() as body_2_4:
    add(body_2_3.part)

    # #6-32 Tapped Hole2 at 4: cut by f_6_32_tapped_hole2_at_4_tool
    add(f_6_32_tapped_hole2_at_4_tool.part, mode=Mode.SUBTRACT)


with BuildPart() as f_6_32_tapped_hole2_at_5_tool:
    # #6-32 Tapped Hole2 at 5: #6-32 Tapped Hole2 ×2
    with Locations(*[(0, 0, -i * F_6_32_TAPPED_HOLE2_AT_5_PITCH) for i in range(1, F_6_32_TAPPED_HOLE2_AT_5_COUNT)]):
        add(f_6_32_tapped_hole2)


with BuildPart() as part_5:
    add(part_4.part)

    # #6-32 Tapped Hole2 at 5: cut by f_6_32_tapped_hole2_at_5_tool
    add(f_6_32_tapped_hole2_at_5_tool.part, mode=Mode.SUBTRACT)


with BuildPart() as body_2_5:
    add(body_2_4.part)

    # #6-32 Tapped Hole2 at 5: cut by f_6_32_tapped_hole2_at_5_tool
    add(f_6_32_tapped_hole2_at_5_tool.part, mode=Mode.SUBTRACT)


with BuildPart() as f_6_32_tapped_hole2_at_6_tool:
    # #6-32 Tapped Hole2 at 6: #6-32 Tapped Hole2 ×2
    with Locations(*[(0, 0, -i * F_6_32_TAPPED_HOLE2_AT_6_PITCH) for i in range(1, F_6_32_TAPPED_HOLE2_AT_6_COUNT)]):
        add(f_6_32_tapped_hole2)


with BuildPart() as part_6:
    add(part_5.part)

    # #6-32 Tapped Hole2 at 6: cut by f_6_32_tapped_hole2_at_6_tool
    add(f_6_32_tapped_hole2_at_6_tool.part, mode=Mode.SUBTRACT)


with BuildPart() as body_2_6:
    add(body_2_5.part)

    # #6-32 Tapped Hole2 at 6: cut by f_6_32_tapped_hole2_at_6_tool
    add(f_6_32_tapped_hole2_at_6_tool.part, mode=Mode.SUBTRACT)


with BuildPart() as f_6_32_tapped_hole2_at_7_tool:
    # #6-32 Tapped Hole2 at 7: #6-32 Tapped Hole2 ×2
    with Locations(*[(0, 0, -i * F_6_32_TAPPED_HOLE2_AT_7_PITCH) for i in range(1, F_6_32_TAPPED_HOLE2_AT_7_COUNT)]):
        add(f_6_32_tapped_hole2)


with BuildPart() as part_7:
    add(part_6.part)

    # #6-32 Tapped Hole2 at 7: cut by f_6_32_tapped_hole2_at_7_tool
    add(f_6_32_tapped_hole2_at_7_tool.part, mode=Mode.SUBTRACT)


with BuildPart() as body_2_7:
    add(body_2_6.part)

    # #6-32 Tapped Hole2 at 7: cut by f_6_32_tapped_hole2_at_7_tool
    add(f_6_32_tapped_hole2_at_7_tool.part, mode=Mode.SUBTRACT)


with BuildPart() as f_6_32_tapped_hole2_at_8_tool:
    # #6-32 Tapped Hole2 at 8: #6-32 Tapped Hole2 ×2
    with Locations(*[(0, 0, -i * F_6_32_TAPPED_HOLE2_AT_8_PITCH) for i in range(1, F_6_32_TAPPED_HOLE2_AT_8_COUNT)]):
        add(f_6_32_tapped_hole2)


with BuildPart() as part_8:
    add(part_7.part)

    # #6-32 Tapped Hole2 at 8: cut by f_6_32_tapped_hole2_at_8_tool
    add(f_6_32_tapped_hole2_at_8_tool.part, mode=Mode.SUBTRACT)


with BuildPart() as body_2_8:
    add(body_2_7.part)

    # #6-32 Tapped Hole2 at 8: cut by f_6_32_tapped_hole2_at_8_tool
    add(f_6_32_tapped_hole2_at_8_tool.part, mode=Mode.SUBTRACT)


with BuildPart() as f_6_32_tapped_hole2_at_9_tool:
    # #6-32 Tapped Hole2 at 9: #6-32 Tapped Hole2 ×2
    with Locations(*[(0, 0, -i * F_6_32_TAPPED_HOLE2_AT_9_PITCH) for i in range(1, F_6_32_TAPPED_HOLE2_AT_9_COUNT)]):
        add(f_6_32_tapped_hole2)


with BuildPart() as part_9:
    add(part_8.part)

    # #6-32 Tapped Hole2 at 9: cut by f_6_32_tapped_hole2_at_9_tool
    add(f_6_32_tapped_hole2_at_9_tool.part, mode=Mode.SUBTRACT)


with BuildPart() as body_2_9:
    add(body_2_8.part)

    # #6-32 Tapped Hole2 at 9: cut by f_6_32_tapped_hole2_at_9_tool
    add(f_6_32_tapped_hole2_at_9_tool.part, mode=Mode.SUBTRACT)


with BuildPart() as f_6_32_tapped_hole2_at_10_tool:
    # #6-32 Tapped Hole2 at 10: #6-32 Tapped Hole2 ×2
    with Locations(*[(0, 0, -i * F_6_32_TAPPED_HOLE2_AT_10_PITCH) for i in range(1, F_6_32_TAPPED_HOLE2_AT_10_COUNT)]):
        add(f_6_32_tapped_hole2)


with BuildPart() as part_10:
    add(part_9.part)

    # #6-32 Tapped Hole2 at 10: cut by f_6_32_tapped_hole2_at_10_tool
    add(f_6_32_tapped_hole2_at_10_tool.part, mode=Mode.SUBTRACT)

    # Sketch21 → #6-32 Tapped Hole3 (revolve, cut)
    with BuildSketch(Plane(origin=(76.2, -111.125, -222.25), x_dir=(0, 0, 1), z_dir=(1, 0, 0))):
        with Locations((0.676275, 1.588)):
            Rectangle(SKETCH21_W, SKETCH21_H)
    f_6_32_tapped_hole3 = revolve(axis=Axis((76.2, -104.775, -222.25), (0, -1, 0)), mode=Mode.SUBTRACT)

    # #6-32 Tapped Hole3 at 2: #6-32 Tapped Hole3 ×2
    with Locations(*[(0, 0, -i * F_6_32_TAPPED_HOLE3_AT_2_PITCH) for i in range(1, F_6_32_TAPPED_HOLE3_AT_2_COUNT)]):
        add(f_6_32_tapped_hole3, mode=Mode.SUBTRACT)

    # #6-32 Tapped Hole3 at 3: #6-32 Tapped Hole3 ×2
    with Locations(*[(0, 0, -i * F_6_32_TAPPED_HOLE3_AT_3_PITCH) for i in range(1, F_6_32_TAPPED_HOLE3_AT_3_COUNT)]):
        add(f_6_32_tapped_hole3, mode=Mode.SUBTRACT)

    # #6-32 Tapped Hole3 at 4: #6-32 Tapped Hole3 ×2
    with Locations(*[(0, 0, -i * F_6_32_TAPPED_HOLE3_AT_4_PITCH) for i in range(1, F_6_32_TAPPED_HOLE3_AT_4_COUNT)]):
        add(f_6_32_tapped_hole3, mode=Mode.SUBTRACT)

    # #6-32 Tapped Hole3 at 5: #6-32 Tapped Hole3 ×2
    with Locations(*[(0, 0, -i * F_6_32_TAPPED_HOLE3_AT_5_PITCH) for i in range(1, F_6_32_TAPPED_HOLE3_AT_5_COUNT)]):
        add(f_6_32_tapped_hole3, mode=Mode.SUBTRACT)

    # #6-32 Tapped Hole3 at 6: #6-32 Tapped Hole3 ×2
    with Locations(*[(0, 0, -i * F_6_32_TAPPED_HOLE3_AT_6_PITCH) for i in range(1, F_6_32_TAPPED_HOLE3_AT_6_COUNT)]):
        add(f_6_32_tapped_hole3, mode=Mode.SUBTRACT)

    # #6-32 Tapped Hole3 at 7: #6-32 Tapped Hole3 ×2
    with Locations(*[(0, 0, -i * F_6_32_TAPPED_HOLE3_AT_7_PITCH) for i in range(1, F_6_32_TAPPED_HOLE3_AT_7_COUNT)]):
        add(f_6_32_tapped_hole3, mode=Mode.SUBTRACT)

    # #6-32 Tapped Hole3 at 8: #6-32 Tapped Hole3 ×2
    with Locations(*[(0, 0, -i * F_6_32_TAPPED_HOLE3_AT_8_PITCH) for i in range(1, F_6_32_TAPPED_HOLE3_AT_8_COUNT)]):
        add(f_6_32_tapped_hole3, mode=Mode.SUBTRACT)

    # #6-32 Tapped Hole3 at 9: #6-32 Tapped Hole3 ×2
    with Locations(*[(0, 0, -i * F_6_32_TAPPED_HOLE3_AT_9_PITCH) for i in range(1, F_6_32_TAPPED_HOLE3_AT_9_COUNT)]):
        add(f_6_32_tapped_hole3, mode=Mode.SUBTRACT)

    # #6-32 Tapped Hole3 at 10: #6-32 Tapped Hole3 ×2
    with Locations(*[(0, 0, -i * F_6_32_TAPPED_HOLE3_AT_10_PITCH) for i in range(1, F_6_32_TAPPED_HOLE3_AT_10_COUNT)]):
        add(f_6_32_tapped_hole3, mode=Mode.SUBTRACT)

    # #6-32 Tapped Hole3 at 11: #6-32 Tapped Hole3 ×2
    with Locations(*[(0, 0, -i * F_6_32_TAPPED_HOLE3_AT_11_PITCH) for i in range(1, F_6_32_TAPPED_HOLE3_AT_11_COUNT)]):
        add(f_6_32_tapped_hole3, mode=Mode.SUBTRACT)

    # #6-32 Tapped Hole3 at 12: #6-32 Tapped Hole3 ×2
    with Locations(*[(0, 0, -i * F_6_32_TAPPED_HOLE3_AT_12_PITCH) for i in range(1, F_6_32_TAPPED_HOLE3_AT_12_COUNT)]):
        add(f_6_32_tapped_hole3, mode=Mode.SUBTRACT)

    # #6-32 Tapped Hole3 at 13: #6-32 Tapped Hole3 ×2
    with Locations(*[(0, 0, -i * F_6_32_TAPPED_HOLE3_AT_13_PITCH) for i in range(1, F_6_32_TAPPED_HOLE3_AT_13_COUNT)]):
        add(f_6_32_tapped_hole3, mode=Mode.SUBTRACT)

    # #6-32 Tapped Hole3 at 14: #6-32 Tapped Hole3 ×2
    with Locations(*[(0, 0, -i * F_6_32_TAPPED_HOLE3_AT_14_PITCH) for i in range(1, F_6_32_TAPPED_HOLE3_AT_14_COUNT)]):
        add(f_6_32_tapped_hole3, mode=Mode.SUBTRACT)

    # #6-32 Tapped Hole3 at 15: #6-32 Tapped Hole3 ×2
    with Locations(*[(0, 0, -i * F_6_32_TAPPED_HOLE3_AT_15_PITCH) for i in range(1, F_6_32_TAPPED_HOLE3_AT_15_COUNT)]):
        add(f_6_32_tapped_hole3, mode=Mode.SUBTRACT)

    # #6-32 Tapped Hole3 at 16: #6-32 Tapped Hole3 ×2
    with Locations(*[(0, 0, -i * F_6_32_TAPPED_HOLE3_AT_16_PITCH) for i in range(1, F_6_32_TAPPED_HOLE3_AT_16_COUNT)]):
        add(f_6_32_tapped_hole3, mode=Mode.SUBTRACT)

    # #6-32 Tapped Hole3 at 17: #6-32 Tapped Hole3 ×2
    with Locations(*[(0, 0, -i * F_6_32_TAPPED_HOLE3_AT_17_PITCH) for i in range(1, F_6_32_TAPPED_HOLE3_AT_17_COUNT)]):
        add(f_6_32_tapped_hole3, mode=Mode.SUBTRACT)


with BuildPart() as body_2_10:
    add(body_2_9.part)

    # #6-32 Tapped Hole2 at 10: cut by f_6_32_tapped_hole2_at_10_tool
    add(f_6_32_tapped_hole2_at_10_tool.part, mode=Mode.SUBTRACT)

    # Mirror1: #6-32 Tapped Hole3 across plane
    add(f_6_32_tapped_hole3.mirror(Plane(origin=(0, 0, 0), x_dir=(0, 0, 1), z_dir=(1, 0, 0))), mode=Mode.SUBTRACT)

    # Mirror1 copy 1 sketch → Mirror1 copy 1 (revolve, cut)
    with BuildSketch(Plane(origin=(-76.2, -111.125, -247.65), x_dir=(0, 0, 1), z_dir=(-1, 0, 0))):
        with Locations((0.676275, -1.588)):
            Rectangle(MIRROR1_COPY_1_SKETCH_W, MIRROR1_COPY_1_SKETCH_H)
    revolve(axis=Axis((-76.2, -104.775, -247.65), (0, 1, 0)), mode=Mode.SUBTRACT)

    # Mirror1 copy 2 sketch → Mirror1 copy 2 (revolve, cut)
    with BuildSketch(Plane(origin=(-76.2, -111.125, -273.05), x_dir=(0, 0, 1), z_dir=(-1, 0, 0))):
        with Locations((0.676275, -1.588)):
            Rectangle(MIRROR1_COPY_2_SKETCH_W, MIRROR1_COPY_2_SKETCH_H)
    revolve(axis=Axis((-76.2, -104.775, -273.05), (0, 1, 0)), mode=Mode.SUBTRACT)

    # Mirror1 copy 3 sketch → Mirror1 copy 3 (revolve, cut)
    with BuildSketch(Plane(origin=(-76.2, -111.125, -298.45), x_dir=(0, 0, 1), z_dir=(-1, 0, 0))):
        with Locations((0.676275, -1.588)):
            Rectangle(MIRROR1_COPY_3_SKETCH_W, MIRROR1_COPY_3_SKETCH_H)
    revolve(axis=Axis((-76.2, -104.775, -298.45), (0, 1, 0)), mode=Mode.SUBTRACT)

    # Mirror1 copy 4 sketch → Mirror1 copy 4 (revolve, cut)
    with BuildSketch(Plane(origin=(-76.2, -111.125, -323.85), x_dir=(0, 0, 1), z_dir=(-1, 0, 0))):
        with Locations((0.676275, -1.588)):
            Rectangle(MIRROR1_COPY_4_SKETCH_W, MIRROR1_COPY_4_SKETCH_H)
    revolve(axis=Axis((-76.2, -104.775, -323.85), (0, 1, 0)), mode=Mode.SUBTRACT)

    # Mirror1 copy 5 sketch → Mirror1 copy 5 (revolve, cut)
    with BuildSketch(Plane(origin=(-76.2, -111.125, -349.25), x_dir=(0, 0, 1), z_dir=(-1, 0, 0))):
        with Locations((0.676275, -1.588)):
            Rectangle(MIRROR1_COPY_5_SKETCH_W, MIRROR1_COPY_5_SKETCH_H)
    revolve(axis=Axis((-76.2, -104.775, -349.25), (0, 1, 0)), mode=Mode.SUBTRACT)

    # Mirror1 copy 6 sketch → Mirror1 copy 6 (revolve, cut)
    with BuildSketch(Plane(origin=(-76.2, -111.125, -425.45), x_dir=(0, 0, 1), z_dir=(-1, 0, 0))):
        with Locations((0.676275, -1.588)):
            Rectangle(MIRROR1_COPY_6_SKETCH_W, MIRROR1_COPY_6_SKETCH_H)
    revolve(axis=Axis((-76.2, -104.775, -425.45), (0, 1, 0)), mode=Mode.SUBTRACT)

    # Mirror1 copy 7 sketch → Mirror1 copy 7 (revolve, cut)
    with BuildSketch(Plane(origin=(-76.2, -111.125, -374.65), x_dir=(0, 0, 1), z_dir=(-1, 0, 0))):
        with Locations((0.676275, -1.588)):
            Rectangle(MIRROR1_COPY_7_SKETCH_W, MIRROR1_COPY_7_SKETCH_H)
    revolve(axis=Axis((-76.2, -104.775, -374.65), (0, 1, 0)), mode=Mode.SUBTRACT)

    # Mirror1 copy 8 sketch → Mirror1 copy 8 (revolve, cut)
    with BuildSketch(Plane(origin=(-76.2, -111.125, -400.05), x_dir=(0, 0, 1), z_dir=(-1, 0, 0))):
        with Locations((0.676275, -1.588)):
            Rectangle(MIRROR1_COPY_8_SKETCH_W, MIRROR1_COPY_8_SKETCH_H)
    revolve(axis=Axis((-76.2, -104.775, -400.05), (0, 1, 0)), mode=Mode.SUBTRACT)

    # Mirror1 copy 9 sketch → Mirror1 copy 9 (revolve, cut)
    with BuildSketch(Plane(origin=(-76.2, -111.125, -476.25), x_dir=(0, 0, 1), z_dir=(-1, 0, 0))):
        with Locations((0.676275, -1.588)):
            Rectangle(MIRROR1_COPY_9_SKETCH_W, MIRROR1_COPY_9_SKETCH_H)
    revolve(axis=Axis((-76.2, -104.775, -476.25), (0, 1, 0)), mode=Mode.SUBTRACT)

    # Mirror1 copy 10 sketch → Mirror1 copy 10 (revolve, cut)
    with BuildSketch(Plane(origin=(-76.2, -111.125, -501.65), x_dir=(0, 0, 1), z_dir=(-1, 0, 0))):
        with Locations((0.676275, -1.588)):
            Rectangle(MIRROR1_COPY_10_SKETCH_W, MIRROR1_COPY_10_SKETCH_H)
    revolve(axis=Axis((-76.2, -104.775, -501.65), (0, 1, 0)), mode=Mode.SUBTRACT)

    # Mirror1 copy 11 sketch → Mirror1 copy 11 (revolve, cut)
    with BuildSketch(Plane(origin=(-76.2, -111.125, -527.05), x_dir=(0, 0, 1), z_dir=(-1, 0, 0))):
        with Locations((0.676275, -1.588)):
            Rectangle(MIRROR1_COPY_11_SKETCH_W, MIRROR1_COPY_11_SKETCH_H)
    revolve(axis=Axis((-76.2, -104.775, -527.05), (0, 1, 0)), mode=Mode.SUBTRACT)

    # Mirror1 copy 12 sketch → Mirror1 copy 12 (revolve, cut)
    with BuildSketch(Plane(origin=(-76.2, -111.125, -552.45), x_dir=(0, 0, 1), z_dir=(-1, 0, 0))):
        with Locations((0.676275, -1.588)):
            Rectangle(MIRROR1_COPY_12_SKETCH_W, MIRROR1_COPY_12_SKETCH_H)
    revolve(axis=Axis((-76.2, -104.775, -552.45), (0, 1, 0)), mode=Mode.SUBTRACT)

    # Mirror1 copy 13 sketch → Mirror1 copy 13 (revolve, cut)
    with BuildSketch(Plane(origin=(-76.2, -111.125, -577.85), x_dir=(0, 0, 1), z_dir=(-1, 0, 0))):
        with Locations((0.676275, -1.588)):
            Rectangle(MIRROR1_COPY_13_SKETCH_W, MIRROR1_COPY_13_SKETCH_H)
    revolve(axis=Axis((-76.2, -104.775, -577.85), (0, 1, 0)), mode=Mode.SUBTRACT)

    # Mirror1 copy 14 sketch → Mirror1 copy 14 (revolve, cut)
    with BuildSketch(Plane(origin=(-76.2, -111.125, -603.25), x_dir=(0, 0, 1), z_dir=(-1, 0, 0))):
        with Locations((0.676275, -1.588)):
            Rectangle(MIRROR1_COPY_14_SKETCH_W, MIRROR1_COPY_14_SKETCH_H)
    revolve(axis=Axis((-76.2, -104.775, -603.25), (0, 1, 0)), mode=Mode.SUBTRACT)

    # Mirror1 copy 15 sketch → Mirror1 copy 15 (revolve, cut)
    with BuildSketch(Plane(origin=(-76.2, -111.125, -628.65), x_dir=(0, 0, 1), z_dir=(-1, 0, 0))):
        with Locations((0.676275, -1.588)):
            Rectangle(MIRROR1_COPY_15_SKETCH_W, MIRROR1_COPY_15_SKETCH_H)
    revolve(axis=Axis((-76.2, -104.775, -628.65), (0, 1, 0)), mode=Mode.SUBTRACT)

    # Mirror1 copy 16 sketch → Mirror1 copy 16 (revolve, cut)
    with BuildSketch(Plane(origin=(-76.2, -111.125, -654.05), x_dir=(0, 0, 1), z_dir=(-1, 0, 0))):
        with Locations((0.676275, -1.588)):
            Rectangle(MIRROR1_COPY_16_SKETCH_W, MIRROR1_COPY_16_SKETCH_H)
    revolve(axis=Axis((-76.2, -104.775, -654.05), (0, 1, 0)), mode=Mode.SUBTRACT)


with BuildPart() as body_13:
    # Sketch9 → Nosecone Base (with draft: the straight prism first)
    with BuildSketch(Plane.XY.offset(-196.85)):
        with BuildLine():
            Line((69.85, 0), (-69.85, 0))
            ThreePointArc((-69.85, 0), (-87.810512242, -7.439487758), (-95.25, -25.4))
            Line((-95.25, -25.4), (-95.25, -171.45))
            ThreePointArc((-95.25, -171.45), (-87.810512242, -189.410512242), (-69.85, -196.85))
            Line((-69.85, -196.85), (69.85, -196.85))
            ThreePointArc((69.85, -196.85), (87.810512242, -189.410512242), (95.25, -171.45))
            Line((95.25, -171.45), (95.25, -25.4))
            ThreePointArc((95.25, -25.4), (87.810512242, -7.439487758), (69.85, 0))
        make_face()
        with Locations((-19.05, -12.7)):
            Circle(SKETCH9_R, mode=Mode.SUBTRACT)
        with Locations((19.05, -12.7)):
            Circle(SKETCH9_R, mode=Mode.SUBTRACT)
    extrude(amount=NOSECONE_BASE_DEPTH)
    # Nosecone Base: the draft: its side faces are tilted about the plane it starts from
    nosecone_base_sides = [body_13.faces().sort_by_distance(p)[0] for p in [
        (95.25, -98.425, -195.2625),
        (87.810512242, -7.439487758, -195.2625),
        (0, 0, -195.2625),
        (-87.810512242, -7.439487758, -195.2625),
        (-95.25, -98.425, -195.2625),
        (-87.810512242, -189.410512242, -195.2625),
        (0, -196.85, -195.2625),
        (87.810512242, -189.410512242, -195.2625),
        (-20.6375, -12.7, -195.2625),
        (17.4625, -12.7, -195.2625),
    ]]
    draft(nosecone_base_sides, Plane.XY.offset(-196.85), NOSECONE_BASE_DRAFT)


solid = body_11.part
